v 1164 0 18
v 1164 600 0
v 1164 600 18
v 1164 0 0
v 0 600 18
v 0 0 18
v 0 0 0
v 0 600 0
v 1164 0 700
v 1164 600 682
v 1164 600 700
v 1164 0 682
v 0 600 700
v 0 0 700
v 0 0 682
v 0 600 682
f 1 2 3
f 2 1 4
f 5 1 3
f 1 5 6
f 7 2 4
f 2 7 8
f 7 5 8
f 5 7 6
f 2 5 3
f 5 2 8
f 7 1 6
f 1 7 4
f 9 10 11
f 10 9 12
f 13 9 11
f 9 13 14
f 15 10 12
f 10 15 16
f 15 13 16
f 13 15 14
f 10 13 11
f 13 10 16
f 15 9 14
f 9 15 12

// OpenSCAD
cube(size = [1164, 600, 18]);

translate(v = [0, 0, 682]) {
	cube(size = [1164, 600, 18]);
}
